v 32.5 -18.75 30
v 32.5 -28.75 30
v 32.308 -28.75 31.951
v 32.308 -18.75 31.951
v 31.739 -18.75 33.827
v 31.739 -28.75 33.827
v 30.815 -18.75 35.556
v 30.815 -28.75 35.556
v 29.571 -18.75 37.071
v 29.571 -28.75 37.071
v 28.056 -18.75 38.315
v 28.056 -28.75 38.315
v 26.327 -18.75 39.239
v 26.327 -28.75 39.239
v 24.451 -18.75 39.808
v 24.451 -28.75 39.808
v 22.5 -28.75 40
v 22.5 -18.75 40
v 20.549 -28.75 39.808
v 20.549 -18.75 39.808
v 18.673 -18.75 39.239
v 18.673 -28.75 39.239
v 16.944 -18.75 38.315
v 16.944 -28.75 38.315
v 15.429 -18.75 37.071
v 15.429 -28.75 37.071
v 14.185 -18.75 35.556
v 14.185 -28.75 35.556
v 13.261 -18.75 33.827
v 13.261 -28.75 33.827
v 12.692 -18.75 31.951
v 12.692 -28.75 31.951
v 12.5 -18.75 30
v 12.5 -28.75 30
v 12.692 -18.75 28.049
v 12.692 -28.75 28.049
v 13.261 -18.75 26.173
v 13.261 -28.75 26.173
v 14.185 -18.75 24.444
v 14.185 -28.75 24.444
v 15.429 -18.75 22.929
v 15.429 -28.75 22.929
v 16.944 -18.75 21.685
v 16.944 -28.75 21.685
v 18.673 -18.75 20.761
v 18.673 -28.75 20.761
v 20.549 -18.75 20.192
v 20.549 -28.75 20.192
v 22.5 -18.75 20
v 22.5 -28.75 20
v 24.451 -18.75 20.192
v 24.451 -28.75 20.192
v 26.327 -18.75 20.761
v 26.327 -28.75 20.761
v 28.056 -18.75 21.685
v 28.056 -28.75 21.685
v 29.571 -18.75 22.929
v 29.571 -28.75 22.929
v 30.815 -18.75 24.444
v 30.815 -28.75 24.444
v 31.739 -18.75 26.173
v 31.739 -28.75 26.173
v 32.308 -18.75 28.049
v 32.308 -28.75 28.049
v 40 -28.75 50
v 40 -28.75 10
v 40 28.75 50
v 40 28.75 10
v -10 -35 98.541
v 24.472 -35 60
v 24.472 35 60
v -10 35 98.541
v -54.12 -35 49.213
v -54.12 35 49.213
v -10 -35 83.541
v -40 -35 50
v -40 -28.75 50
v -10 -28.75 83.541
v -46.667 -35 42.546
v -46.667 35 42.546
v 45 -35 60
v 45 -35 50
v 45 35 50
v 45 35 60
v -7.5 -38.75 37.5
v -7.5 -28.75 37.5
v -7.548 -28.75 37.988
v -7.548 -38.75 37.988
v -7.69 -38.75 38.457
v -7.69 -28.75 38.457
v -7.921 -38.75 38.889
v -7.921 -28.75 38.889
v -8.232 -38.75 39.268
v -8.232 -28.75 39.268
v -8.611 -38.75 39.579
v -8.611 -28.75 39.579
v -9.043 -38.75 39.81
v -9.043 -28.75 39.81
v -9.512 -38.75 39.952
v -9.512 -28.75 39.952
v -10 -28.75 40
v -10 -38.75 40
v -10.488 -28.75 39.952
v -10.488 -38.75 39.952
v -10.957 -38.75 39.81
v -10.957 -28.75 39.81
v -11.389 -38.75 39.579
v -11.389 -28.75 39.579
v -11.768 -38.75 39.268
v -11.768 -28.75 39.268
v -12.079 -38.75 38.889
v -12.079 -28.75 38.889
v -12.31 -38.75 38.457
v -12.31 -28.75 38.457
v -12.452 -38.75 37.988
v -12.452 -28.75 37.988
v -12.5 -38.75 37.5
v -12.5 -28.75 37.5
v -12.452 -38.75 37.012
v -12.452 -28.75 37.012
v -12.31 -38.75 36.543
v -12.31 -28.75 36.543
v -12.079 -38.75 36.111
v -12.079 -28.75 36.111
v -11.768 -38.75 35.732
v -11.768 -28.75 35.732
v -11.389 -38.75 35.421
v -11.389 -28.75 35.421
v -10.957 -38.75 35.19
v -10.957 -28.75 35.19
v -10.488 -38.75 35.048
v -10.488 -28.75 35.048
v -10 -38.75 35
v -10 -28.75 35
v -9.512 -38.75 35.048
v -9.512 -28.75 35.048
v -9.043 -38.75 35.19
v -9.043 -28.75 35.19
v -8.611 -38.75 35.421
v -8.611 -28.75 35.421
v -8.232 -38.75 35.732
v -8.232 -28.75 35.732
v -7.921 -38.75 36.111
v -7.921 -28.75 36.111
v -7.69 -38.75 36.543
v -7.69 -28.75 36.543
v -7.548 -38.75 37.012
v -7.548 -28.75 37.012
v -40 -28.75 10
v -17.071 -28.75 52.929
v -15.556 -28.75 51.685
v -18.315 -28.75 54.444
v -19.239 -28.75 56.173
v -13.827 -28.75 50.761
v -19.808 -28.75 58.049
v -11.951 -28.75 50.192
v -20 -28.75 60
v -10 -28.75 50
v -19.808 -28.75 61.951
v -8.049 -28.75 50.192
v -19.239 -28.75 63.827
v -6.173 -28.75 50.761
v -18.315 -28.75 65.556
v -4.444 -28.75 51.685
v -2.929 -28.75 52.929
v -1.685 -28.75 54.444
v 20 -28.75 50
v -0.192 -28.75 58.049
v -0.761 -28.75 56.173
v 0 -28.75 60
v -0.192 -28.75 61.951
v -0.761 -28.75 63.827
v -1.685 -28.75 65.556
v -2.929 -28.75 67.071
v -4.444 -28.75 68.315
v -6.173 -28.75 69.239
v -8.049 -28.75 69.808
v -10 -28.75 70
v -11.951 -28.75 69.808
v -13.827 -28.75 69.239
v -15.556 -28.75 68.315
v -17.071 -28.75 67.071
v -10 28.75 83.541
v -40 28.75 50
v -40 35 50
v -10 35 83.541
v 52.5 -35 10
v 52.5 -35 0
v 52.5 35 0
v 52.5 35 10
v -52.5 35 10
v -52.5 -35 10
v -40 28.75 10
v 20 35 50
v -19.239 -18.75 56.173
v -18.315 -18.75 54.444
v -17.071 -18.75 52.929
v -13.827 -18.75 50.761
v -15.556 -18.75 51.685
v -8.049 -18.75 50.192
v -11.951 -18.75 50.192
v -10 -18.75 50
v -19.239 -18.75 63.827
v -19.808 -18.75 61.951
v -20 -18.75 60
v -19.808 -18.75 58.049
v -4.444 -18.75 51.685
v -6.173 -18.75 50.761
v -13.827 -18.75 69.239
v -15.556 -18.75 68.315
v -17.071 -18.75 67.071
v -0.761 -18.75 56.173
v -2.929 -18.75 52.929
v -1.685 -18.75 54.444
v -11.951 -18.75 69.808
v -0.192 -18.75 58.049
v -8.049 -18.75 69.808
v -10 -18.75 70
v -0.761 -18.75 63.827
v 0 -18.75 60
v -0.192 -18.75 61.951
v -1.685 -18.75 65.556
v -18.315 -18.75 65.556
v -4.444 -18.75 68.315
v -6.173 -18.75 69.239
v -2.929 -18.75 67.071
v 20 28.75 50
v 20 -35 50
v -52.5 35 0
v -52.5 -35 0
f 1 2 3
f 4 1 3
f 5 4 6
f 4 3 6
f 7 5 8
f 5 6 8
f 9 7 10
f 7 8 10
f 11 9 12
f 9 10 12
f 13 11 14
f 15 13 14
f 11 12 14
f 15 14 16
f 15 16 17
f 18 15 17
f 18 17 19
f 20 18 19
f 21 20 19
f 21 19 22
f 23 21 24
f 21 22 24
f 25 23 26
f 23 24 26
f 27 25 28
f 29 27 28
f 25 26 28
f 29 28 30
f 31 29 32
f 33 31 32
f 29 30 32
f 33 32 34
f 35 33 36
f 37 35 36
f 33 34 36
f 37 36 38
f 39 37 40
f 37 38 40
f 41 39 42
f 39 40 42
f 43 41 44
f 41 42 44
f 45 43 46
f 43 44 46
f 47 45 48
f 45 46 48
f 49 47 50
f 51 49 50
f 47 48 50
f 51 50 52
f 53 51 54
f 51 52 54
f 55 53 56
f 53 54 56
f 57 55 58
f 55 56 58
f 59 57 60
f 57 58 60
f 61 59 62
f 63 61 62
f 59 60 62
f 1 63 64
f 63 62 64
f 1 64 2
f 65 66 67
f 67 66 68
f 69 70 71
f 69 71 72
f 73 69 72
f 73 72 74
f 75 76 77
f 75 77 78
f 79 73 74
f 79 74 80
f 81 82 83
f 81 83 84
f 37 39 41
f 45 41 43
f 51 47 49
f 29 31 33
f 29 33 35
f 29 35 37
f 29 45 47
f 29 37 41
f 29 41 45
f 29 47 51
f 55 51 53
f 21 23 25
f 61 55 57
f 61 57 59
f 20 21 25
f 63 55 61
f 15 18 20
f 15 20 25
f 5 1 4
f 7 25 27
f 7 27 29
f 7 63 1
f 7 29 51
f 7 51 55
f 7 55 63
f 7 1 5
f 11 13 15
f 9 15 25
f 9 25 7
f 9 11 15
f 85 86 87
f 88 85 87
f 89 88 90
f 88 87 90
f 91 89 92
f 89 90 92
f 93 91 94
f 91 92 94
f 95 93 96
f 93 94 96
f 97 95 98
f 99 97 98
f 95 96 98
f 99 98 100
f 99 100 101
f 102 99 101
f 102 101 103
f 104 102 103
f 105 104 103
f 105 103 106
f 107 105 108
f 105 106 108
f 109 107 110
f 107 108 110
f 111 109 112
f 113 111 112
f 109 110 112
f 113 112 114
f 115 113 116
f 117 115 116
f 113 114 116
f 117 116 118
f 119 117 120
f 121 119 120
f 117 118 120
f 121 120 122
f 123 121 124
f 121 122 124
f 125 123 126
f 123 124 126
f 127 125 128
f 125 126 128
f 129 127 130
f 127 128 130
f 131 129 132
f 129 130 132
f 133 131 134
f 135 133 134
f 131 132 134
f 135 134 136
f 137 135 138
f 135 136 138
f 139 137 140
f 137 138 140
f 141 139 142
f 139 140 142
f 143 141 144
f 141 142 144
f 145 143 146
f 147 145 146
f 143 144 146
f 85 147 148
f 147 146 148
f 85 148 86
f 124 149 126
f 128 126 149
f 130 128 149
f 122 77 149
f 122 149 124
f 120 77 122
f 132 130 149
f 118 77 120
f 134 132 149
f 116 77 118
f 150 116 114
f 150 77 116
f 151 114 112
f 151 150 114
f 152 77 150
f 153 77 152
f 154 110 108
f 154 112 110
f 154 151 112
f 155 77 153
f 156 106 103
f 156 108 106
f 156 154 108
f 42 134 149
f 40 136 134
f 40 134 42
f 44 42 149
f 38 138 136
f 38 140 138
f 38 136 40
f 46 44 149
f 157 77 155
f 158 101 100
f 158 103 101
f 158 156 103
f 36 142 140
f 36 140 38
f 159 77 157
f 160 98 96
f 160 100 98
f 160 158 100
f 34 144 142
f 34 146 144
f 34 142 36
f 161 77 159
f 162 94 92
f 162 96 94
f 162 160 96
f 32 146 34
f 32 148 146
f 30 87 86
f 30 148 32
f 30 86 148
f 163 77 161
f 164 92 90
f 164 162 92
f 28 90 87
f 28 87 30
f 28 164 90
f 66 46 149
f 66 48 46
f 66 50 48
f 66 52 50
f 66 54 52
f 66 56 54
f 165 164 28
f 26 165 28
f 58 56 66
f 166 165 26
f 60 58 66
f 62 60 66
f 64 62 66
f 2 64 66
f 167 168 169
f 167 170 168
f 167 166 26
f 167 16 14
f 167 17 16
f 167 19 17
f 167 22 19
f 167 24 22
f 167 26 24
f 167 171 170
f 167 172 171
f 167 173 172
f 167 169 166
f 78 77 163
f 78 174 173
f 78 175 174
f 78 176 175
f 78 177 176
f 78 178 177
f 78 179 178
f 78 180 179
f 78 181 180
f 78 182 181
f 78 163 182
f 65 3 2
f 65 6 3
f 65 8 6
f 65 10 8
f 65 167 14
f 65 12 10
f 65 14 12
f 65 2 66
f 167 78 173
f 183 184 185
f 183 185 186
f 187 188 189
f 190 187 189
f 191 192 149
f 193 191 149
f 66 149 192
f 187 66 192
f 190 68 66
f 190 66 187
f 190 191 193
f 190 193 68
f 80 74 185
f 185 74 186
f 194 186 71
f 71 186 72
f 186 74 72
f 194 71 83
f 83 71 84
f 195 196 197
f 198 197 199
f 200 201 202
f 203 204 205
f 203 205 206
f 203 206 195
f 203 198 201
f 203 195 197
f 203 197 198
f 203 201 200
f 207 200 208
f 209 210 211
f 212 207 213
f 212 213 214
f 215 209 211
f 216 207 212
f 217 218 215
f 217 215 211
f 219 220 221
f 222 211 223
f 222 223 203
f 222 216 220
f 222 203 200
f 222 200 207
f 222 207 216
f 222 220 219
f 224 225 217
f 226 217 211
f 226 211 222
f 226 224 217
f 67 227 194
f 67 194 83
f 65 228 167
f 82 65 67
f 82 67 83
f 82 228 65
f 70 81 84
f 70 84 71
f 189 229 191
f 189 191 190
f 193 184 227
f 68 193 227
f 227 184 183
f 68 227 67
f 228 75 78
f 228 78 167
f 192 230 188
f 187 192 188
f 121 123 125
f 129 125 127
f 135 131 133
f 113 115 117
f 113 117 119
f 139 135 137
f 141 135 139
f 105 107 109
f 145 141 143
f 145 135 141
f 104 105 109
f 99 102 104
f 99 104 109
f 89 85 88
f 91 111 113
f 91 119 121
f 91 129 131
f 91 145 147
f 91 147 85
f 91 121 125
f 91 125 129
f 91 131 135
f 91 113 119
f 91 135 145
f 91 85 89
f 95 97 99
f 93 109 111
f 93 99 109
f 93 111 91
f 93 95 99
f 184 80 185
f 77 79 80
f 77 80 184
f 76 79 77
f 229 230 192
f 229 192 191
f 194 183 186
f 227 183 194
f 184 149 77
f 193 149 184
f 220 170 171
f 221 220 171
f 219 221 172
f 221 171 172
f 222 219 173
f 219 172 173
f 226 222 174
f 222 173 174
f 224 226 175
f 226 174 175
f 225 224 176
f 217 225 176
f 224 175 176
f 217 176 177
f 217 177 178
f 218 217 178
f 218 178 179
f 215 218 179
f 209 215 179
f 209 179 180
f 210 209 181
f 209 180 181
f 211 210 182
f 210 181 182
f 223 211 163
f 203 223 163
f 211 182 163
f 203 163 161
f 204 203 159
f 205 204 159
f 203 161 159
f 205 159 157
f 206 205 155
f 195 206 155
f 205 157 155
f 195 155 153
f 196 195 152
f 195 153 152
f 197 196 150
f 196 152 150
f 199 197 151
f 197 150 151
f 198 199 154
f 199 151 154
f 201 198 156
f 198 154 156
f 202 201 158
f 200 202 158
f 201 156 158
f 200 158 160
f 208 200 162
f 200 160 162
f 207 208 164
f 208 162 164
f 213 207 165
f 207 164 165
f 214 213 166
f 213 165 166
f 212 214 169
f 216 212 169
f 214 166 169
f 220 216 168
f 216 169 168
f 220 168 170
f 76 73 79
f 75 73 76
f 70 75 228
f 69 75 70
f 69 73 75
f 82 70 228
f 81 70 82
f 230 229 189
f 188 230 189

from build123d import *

# Parameters (mm, degrees)
F0_W      = 105
F0_H      = 70
F1_DEPTH  = 10
F2_W      = 80
F2_H      = 57.5
F3_DEPTH  = 40
F5_DEPTH  = 57.5
F7_DEPTH  = 70
F8_R      = 2.5
F9_DEPTH  = 10
F10_R     = 10
F11_DEPTH = 10
F12_R     = 10
F13_DEPTH = 10


with BuildPart() as f1:
    # F0 (on Top) → F1 (new body)
    with BuildSketch(Plane.XY):
        Rectangle(F0_W, F0_H)
    extrude(amount=F1_DEPTH)

    # F2 (on face) → F3 (join)
    with BuildSketch(Plane.XY.offset(10)):
        Rectangle(F2_W, F2_H)
    extrude(amount=F3_DEPTH)

    # F4 (on face) → F5 (join)
    with BuildSketch(Plane.XZ.offset(28.75)):
        Polygon((-10, 83.54102), (-40, 50), (20, 50), align=None)
    extrude(amount=-F5_DEPTH)

    # F6 (on face) → F7 (join, through all)
    with BuildSketch(Plane.XZ.offset(35)):
        Polygon((20, 50), (45, 50), (45, 60), (24.472136, 60), (-10, 98.54102), (-54.120227, 49.213107), (-46.666667, 42.54644), (-40, 50), (-10, 83.54102), align=None)
    extrude(amount=-F7_DEPTH)

    # F8 (on face) → F9 (join)
    with BuildSketch(Plane.XZ.offset(28.75)):
        with Locations((-10, 37.5)):
            Circle(F8_R)
    extrude(amount=F9_DEPTH)

    # F10 (on face) → F11 (cut)
    with BuildSketch(Plane.XZ.offset(28.75)):
        with Locations((22.5, 30)):
            Circle(F10_R)
    extrude(amount=-F11_DEPTH, mode=Mode.SUBTRACT)

    # F12 (on face) → F13 (cut)
    with BuildSketch(Plane.XZ.offset(28.75)):
        with Locations((-10, 60)):
            Circle(F12_R)
    extrude(amount=-F13_DEPTH, mode=Mode.SUBTRACT)


solid = f1.part
